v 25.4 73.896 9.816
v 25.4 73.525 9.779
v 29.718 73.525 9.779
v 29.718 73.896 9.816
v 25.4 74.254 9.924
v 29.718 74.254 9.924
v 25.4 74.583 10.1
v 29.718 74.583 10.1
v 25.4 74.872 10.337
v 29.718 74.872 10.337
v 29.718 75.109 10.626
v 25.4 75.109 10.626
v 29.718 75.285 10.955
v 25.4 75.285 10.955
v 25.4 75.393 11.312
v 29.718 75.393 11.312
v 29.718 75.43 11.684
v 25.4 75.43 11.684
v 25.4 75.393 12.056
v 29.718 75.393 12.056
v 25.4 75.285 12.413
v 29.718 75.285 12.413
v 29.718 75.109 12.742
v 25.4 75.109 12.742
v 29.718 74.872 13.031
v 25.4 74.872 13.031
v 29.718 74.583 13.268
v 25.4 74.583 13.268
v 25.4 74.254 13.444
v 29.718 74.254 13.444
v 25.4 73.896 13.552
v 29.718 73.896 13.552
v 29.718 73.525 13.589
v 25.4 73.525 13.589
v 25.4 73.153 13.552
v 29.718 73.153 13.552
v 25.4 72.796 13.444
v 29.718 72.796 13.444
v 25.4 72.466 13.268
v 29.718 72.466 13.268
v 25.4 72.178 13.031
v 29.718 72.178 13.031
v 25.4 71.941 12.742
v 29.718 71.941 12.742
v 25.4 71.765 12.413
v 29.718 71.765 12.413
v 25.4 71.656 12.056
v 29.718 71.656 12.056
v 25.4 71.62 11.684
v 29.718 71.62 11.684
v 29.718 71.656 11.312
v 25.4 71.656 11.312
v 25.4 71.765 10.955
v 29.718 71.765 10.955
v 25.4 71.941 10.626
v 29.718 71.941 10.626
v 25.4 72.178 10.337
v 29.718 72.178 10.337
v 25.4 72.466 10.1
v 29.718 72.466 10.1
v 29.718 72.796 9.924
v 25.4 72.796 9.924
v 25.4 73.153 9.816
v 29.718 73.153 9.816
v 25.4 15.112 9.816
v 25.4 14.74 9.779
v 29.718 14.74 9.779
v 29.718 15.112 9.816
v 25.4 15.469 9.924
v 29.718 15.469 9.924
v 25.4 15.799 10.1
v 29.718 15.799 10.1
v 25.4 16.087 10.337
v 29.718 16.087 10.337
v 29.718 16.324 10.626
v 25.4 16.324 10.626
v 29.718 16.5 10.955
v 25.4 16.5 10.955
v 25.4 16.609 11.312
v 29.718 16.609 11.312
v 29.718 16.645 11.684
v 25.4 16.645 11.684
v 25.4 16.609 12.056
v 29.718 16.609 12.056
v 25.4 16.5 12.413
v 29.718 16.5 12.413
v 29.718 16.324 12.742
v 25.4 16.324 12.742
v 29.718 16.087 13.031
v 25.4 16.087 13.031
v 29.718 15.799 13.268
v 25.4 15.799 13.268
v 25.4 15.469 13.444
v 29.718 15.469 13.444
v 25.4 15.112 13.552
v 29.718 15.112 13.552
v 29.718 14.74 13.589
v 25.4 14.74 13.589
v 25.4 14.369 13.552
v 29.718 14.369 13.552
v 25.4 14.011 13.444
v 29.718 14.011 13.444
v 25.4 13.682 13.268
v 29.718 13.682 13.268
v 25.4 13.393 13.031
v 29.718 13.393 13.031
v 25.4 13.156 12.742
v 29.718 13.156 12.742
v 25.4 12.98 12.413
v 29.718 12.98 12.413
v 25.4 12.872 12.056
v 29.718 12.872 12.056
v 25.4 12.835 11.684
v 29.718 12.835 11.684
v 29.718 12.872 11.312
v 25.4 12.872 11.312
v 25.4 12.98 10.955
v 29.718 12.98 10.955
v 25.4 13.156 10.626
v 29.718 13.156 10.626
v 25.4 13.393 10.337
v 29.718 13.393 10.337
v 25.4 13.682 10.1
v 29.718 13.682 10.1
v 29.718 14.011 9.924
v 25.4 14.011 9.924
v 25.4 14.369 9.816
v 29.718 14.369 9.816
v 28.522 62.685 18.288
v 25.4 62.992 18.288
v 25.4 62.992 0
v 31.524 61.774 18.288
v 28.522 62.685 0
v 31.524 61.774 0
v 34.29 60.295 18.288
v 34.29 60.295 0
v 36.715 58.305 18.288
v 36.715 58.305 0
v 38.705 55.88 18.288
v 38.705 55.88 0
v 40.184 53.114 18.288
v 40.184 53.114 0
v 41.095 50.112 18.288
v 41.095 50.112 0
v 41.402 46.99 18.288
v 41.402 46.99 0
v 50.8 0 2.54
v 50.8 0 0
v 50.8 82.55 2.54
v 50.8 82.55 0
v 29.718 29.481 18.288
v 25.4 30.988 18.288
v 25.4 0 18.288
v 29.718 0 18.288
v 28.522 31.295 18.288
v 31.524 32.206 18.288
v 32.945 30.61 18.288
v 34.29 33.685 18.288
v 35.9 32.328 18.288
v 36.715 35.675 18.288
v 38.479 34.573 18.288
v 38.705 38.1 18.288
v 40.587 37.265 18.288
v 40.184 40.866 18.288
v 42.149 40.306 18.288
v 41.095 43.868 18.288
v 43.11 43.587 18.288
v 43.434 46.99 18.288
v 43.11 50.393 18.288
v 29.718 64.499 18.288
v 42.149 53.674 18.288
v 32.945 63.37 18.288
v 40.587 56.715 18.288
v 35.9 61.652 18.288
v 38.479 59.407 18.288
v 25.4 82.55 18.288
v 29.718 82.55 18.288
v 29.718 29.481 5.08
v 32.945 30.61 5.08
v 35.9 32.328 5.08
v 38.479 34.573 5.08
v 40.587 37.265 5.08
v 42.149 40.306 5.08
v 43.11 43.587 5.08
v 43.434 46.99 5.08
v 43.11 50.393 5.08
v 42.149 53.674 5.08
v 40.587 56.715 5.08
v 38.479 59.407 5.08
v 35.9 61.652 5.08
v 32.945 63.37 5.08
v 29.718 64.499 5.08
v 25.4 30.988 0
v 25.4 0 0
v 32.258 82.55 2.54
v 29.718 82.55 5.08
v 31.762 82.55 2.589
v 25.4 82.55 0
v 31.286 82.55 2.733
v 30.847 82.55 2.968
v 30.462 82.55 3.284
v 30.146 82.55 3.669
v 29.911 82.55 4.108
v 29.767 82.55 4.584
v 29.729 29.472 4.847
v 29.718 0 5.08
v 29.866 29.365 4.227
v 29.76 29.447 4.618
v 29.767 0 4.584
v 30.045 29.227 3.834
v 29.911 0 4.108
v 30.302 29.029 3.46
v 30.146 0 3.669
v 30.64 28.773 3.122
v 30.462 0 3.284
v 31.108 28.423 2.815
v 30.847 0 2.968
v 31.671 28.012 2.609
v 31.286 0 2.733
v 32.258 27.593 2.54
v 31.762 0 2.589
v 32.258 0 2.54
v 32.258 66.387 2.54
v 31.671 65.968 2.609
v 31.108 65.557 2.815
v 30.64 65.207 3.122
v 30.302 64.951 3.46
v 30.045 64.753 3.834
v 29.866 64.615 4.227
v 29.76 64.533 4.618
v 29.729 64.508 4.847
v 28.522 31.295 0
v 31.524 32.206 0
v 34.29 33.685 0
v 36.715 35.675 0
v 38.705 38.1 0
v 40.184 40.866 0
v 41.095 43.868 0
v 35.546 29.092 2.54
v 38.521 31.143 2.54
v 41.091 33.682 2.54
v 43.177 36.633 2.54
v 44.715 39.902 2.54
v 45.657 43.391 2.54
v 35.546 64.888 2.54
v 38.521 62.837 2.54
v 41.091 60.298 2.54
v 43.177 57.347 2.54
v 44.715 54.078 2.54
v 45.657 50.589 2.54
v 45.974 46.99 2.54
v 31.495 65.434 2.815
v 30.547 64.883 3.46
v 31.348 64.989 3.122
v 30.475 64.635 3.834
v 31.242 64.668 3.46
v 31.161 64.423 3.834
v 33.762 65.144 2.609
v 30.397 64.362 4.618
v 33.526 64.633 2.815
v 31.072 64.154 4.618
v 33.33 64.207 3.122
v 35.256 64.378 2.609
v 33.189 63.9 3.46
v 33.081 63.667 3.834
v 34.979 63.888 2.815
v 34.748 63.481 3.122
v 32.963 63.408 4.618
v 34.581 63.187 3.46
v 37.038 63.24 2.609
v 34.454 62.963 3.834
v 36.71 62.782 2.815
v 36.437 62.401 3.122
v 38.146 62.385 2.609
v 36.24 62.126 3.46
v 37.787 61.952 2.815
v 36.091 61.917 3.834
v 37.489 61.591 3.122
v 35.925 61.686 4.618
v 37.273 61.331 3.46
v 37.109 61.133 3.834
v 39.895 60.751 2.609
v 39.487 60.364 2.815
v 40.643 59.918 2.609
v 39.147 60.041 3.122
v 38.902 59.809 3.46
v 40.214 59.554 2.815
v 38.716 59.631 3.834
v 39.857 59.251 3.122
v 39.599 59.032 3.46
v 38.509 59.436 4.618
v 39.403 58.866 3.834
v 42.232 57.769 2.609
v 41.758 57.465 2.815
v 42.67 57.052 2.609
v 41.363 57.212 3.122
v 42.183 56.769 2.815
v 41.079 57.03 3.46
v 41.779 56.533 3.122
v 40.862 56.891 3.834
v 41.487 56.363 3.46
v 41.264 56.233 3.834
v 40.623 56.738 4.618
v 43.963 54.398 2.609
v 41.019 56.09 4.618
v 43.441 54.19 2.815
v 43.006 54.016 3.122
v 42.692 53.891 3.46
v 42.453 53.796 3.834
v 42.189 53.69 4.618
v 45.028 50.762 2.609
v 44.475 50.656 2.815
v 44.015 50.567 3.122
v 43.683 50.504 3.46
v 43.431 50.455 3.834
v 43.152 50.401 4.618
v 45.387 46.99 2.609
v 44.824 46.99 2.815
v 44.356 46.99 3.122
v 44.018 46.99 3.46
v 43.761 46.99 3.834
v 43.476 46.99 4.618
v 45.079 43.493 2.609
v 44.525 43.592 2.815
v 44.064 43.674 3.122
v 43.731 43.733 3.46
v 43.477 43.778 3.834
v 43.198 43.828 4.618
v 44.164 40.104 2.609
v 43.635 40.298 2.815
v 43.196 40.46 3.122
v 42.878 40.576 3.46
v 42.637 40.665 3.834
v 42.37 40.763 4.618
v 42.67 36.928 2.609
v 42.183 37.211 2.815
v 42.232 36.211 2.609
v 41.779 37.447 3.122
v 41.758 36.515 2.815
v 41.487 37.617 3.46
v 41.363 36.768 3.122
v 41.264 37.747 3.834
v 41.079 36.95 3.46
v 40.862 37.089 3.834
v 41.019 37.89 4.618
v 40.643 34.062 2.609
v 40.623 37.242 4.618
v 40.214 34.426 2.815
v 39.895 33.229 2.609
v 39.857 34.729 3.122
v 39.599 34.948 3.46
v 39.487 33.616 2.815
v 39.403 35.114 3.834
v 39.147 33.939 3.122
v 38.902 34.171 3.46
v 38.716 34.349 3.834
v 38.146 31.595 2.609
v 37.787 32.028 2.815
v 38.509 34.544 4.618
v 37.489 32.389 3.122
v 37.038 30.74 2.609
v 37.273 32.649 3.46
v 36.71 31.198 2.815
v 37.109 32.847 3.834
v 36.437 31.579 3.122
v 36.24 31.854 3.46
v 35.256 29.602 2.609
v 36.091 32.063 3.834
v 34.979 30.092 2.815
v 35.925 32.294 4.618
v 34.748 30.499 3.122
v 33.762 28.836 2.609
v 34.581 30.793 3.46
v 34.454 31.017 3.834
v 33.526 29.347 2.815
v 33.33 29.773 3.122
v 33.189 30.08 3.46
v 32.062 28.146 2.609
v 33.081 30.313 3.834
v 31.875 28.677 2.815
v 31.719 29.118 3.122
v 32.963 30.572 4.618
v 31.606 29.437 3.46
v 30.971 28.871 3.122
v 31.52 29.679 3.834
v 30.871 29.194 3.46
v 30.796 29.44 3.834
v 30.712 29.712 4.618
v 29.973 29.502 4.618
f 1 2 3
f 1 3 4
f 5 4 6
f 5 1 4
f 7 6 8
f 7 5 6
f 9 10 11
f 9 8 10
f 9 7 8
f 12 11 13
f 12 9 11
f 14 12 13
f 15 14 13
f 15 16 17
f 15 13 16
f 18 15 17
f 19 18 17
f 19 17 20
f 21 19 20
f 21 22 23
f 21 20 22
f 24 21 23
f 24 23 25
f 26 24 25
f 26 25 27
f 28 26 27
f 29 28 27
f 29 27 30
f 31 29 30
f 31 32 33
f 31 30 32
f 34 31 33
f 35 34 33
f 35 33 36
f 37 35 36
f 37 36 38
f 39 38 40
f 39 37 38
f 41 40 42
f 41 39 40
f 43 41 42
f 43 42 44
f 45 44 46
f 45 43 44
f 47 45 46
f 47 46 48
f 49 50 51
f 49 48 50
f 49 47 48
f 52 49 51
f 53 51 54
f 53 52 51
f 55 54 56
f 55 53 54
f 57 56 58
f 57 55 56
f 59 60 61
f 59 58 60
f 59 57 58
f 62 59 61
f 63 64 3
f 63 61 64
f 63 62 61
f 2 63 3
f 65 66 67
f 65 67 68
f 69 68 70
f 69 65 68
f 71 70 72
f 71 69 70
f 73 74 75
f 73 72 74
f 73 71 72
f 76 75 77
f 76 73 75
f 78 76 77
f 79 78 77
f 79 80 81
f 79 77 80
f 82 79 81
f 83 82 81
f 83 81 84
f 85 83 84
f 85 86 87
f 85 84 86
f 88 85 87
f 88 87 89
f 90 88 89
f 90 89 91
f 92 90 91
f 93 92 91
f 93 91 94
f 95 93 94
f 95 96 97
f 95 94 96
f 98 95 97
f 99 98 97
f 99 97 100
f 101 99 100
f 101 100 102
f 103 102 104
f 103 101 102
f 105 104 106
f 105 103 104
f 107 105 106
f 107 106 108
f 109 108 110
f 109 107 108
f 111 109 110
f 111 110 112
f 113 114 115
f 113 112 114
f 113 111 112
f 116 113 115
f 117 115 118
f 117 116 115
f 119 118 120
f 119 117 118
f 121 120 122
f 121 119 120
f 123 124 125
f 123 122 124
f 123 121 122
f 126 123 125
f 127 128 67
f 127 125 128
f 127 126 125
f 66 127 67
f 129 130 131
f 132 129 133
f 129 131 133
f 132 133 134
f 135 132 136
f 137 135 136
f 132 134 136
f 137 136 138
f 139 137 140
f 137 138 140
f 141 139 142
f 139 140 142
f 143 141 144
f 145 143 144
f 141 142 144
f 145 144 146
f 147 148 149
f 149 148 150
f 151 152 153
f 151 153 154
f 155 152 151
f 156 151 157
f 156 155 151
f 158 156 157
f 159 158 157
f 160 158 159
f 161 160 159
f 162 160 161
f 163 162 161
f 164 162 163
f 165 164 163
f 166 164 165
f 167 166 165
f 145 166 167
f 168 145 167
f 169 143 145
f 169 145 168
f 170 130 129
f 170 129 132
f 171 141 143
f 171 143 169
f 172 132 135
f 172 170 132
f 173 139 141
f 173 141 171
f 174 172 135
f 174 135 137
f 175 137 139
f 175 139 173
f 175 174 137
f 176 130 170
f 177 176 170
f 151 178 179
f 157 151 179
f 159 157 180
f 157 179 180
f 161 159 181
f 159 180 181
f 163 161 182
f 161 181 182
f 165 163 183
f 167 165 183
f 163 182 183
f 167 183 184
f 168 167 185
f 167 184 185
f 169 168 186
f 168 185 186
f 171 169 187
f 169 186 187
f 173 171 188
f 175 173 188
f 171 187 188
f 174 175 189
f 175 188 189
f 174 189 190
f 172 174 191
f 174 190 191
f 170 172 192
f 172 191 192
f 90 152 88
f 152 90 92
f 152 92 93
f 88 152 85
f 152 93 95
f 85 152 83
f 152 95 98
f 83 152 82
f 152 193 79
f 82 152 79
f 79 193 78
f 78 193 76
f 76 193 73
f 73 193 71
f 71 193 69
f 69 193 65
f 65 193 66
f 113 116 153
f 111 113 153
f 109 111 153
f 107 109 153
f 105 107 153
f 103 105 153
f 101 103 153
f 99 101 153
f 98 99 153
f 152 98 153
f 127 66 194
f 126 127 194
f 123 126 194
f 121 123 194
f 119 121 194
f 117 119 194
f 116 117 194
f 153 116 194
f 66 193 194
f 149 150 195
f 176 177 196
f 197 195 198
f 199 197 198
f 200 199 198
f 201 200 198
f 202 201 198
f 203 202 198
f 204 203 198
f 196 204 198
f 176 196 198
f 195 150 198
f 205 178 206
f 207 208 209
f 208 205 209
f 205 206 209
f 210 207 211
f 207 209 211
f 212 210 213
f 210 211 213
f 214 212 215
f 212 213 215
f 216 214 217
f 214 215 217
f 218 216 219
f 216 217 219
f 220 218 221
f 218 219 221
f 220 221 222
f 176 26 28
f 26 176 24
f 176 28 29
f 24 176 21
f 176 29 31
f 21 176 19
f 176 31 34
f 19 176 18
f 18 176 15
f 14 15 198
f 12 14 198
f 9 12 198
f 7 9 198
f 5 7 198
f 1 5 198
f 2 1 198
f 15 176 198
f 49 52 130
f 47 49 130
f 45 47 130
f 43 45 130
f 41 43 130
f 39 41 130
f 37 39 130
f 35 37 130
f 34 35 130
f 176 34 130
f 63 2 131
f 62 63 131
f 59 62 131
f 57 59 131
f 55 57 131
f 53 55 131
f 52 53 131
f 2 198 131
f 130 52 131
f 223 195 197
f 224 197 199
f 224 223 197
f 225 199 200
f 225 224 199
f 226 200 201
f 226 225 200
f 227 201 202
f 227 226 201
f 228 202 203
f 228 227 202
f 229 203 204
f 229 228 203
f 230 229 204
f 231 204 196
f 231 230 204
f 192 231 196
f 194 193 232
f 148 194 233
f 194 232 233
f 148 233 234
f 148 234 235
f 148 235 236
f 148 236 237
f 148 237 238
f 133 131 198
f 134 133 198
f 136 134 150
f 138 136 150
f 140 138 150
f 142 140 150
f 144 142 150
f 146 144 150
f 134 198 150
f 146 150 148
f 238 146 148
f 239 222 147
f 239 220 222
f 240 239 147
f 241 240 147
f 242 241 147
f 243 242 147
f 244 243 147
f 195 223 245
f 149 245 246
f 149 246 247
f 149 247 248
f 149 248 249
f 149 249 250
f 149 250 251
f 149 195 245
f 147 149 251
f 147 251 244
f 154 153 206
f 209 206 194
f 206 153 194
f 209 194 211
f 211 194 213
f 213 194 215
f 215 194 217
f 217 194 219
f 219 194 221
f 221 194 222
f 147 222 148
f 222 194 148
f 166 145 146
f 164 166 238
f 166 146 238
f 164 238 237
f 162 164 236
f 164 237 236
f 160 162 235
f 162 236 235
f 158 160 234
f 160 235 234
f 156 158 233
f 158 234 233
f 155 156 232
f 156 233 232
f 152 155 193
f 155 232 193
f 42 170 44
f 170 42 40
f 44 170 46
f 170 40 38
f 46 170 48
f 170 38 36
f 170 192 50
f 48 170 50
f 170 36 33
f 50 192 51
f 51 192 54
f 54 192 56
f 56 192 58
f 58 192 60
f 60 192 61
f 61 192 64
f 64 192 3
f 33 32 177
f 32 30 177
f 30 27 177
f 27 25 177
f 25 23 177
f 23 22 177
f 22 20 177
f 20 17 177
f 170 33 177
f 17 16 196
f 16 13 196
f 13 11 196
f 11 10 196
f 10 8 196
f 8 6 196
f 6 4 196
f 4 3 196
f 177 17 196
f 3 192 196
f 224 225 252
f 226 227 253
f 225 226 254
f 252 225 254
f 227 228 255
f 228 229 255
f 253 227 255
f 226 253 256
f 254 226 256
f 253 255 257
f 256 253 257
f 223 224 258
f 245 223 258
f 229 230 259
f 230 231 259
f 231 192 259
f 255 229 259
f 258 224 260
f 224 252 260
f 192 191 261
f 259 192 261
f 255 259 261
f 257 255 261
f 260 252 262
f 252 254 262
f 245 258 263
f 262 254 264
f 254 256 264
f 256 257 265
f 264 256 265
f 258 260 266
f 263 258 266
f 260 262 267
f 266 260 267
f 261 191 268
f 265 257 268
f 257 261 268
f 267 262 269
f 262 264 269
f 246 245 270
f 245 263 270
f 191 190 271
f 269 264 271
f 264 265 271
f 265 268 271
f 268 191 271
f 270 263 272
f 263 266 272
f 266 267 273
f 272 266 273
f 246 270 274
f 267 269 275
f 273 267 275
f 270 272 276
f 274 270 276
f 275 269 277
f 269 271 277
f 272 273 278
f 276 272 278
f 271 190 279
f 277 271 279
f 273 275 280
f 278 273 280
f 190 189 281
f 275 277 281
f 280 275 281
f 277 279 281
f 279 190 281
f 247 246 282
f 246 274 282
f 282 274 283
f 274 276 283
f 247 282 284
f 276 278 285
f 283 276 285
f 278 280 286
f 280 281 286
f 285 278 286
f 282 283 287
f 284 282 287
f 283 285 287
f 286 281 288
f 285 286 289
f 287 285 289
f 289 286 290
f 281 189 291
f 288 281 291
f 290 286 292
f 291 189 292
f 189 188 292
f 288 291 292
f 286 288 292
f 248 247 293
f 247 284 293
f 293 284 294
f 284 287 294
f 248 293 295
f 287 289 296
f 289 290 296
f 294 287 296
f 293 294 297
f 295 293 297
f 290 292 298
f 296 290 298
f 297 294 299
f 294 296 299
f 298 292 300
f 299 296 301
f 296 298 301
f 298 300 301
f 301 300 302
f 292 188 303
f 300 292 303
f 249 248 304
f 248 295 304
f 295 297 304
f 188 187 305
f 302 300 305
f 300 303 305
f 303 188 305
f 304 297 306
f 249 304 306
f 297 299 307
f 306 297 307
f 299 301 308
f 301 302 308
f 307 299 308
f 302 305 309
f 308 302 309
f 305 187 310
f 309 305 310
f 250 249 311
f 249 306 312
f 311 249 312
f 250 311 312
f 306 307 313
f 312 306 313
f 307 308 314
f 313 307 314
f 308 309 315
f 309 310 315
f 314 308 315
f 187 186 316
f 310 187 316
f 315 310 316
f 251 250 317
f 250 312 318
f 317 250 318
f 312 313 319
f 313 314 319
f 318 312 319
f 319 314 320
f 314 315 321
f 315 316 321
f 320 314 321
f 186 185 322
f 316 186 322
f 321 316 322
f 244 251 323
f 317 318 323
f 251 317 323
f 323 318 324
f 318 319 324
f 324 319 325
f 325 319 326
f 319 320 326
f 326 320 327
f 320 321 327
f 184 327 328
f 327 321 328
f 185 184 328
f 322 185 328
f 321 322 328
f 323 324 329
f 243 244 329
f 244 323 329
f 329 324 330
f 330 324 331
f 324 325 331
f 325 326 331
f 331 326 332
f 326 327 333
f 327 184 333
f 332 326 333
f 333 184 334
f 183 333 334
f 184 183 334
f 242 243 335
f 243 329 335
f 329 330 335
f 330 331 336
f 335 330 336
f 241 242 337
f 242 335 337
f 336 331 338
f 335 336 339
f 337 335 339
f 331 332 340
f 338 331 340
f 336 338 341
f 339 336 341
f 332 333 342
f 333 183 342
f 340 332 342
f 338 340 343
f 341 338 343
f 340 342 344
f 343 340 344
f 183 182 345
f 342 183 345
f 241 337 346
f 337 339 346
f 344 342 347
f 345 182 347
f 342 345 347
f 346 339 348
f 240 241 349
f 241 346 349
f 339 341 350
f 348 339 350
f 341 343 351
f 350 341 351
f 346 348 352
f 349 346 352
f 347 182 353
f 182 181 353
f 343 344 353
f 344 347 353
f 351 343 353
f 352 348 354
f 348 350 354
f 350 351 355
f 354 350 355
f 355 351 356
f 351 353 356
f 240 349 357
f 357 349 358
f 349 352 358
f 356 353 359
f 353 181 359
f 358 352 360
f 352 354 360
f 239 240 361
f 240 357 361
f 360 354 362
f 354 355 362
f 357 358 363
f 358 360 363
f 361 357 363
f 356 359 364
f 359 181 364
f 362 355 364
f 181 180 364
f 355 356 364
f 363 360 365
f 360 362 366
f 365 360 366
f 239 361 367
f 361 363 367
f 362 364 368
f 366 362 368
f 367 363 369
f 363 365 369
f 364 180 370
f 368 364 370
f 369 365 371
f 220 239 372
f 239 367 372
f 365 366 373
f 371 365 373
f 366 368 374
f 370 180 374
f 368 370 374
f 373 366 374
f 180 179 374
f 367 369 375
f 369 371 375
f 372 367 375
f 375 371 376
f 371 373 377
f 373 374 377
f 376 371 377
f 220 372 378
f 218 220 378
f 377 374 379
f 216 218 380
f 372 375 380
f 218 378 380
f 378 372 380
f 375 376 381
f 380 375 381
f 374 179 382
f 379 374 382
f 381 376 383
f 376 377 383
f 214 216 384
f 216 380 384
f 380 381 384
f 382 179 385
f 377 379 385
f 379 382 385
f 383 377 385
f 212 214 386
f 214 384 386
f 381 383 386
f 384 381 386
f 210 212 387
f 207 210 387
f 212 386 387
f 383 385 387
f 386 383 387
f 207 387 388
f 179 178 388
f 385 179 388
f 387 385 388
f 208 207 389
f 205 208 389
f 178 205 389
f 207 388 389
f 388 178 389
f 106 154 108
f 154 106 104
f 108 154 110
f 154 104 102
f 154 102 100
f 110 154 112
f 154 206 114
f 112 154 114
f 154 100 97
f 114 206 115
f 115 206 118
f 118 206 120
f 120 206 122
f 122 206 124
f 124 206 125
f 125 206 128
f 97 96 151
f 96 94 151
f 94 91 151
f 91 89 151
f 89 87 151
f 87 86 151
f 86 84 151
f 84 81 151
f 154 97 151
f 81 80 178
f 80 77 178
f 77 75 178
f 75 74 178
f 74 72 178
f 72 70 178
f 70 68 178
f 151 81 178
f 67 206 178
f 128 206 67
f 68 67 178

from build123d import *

# Parameters (mm, degrees)
BOSS_EXTRUDE6_DEPTH = 18.288
BOSS_EXTRUDE7_DEPTH = 2.54
SKETCH4_R           = 1.905
CUT_EXTRUDE2_DEPTH  = 51.8
FILLET2_R           = 2.54


with BuildPart() as part:
    # Sketch3 → Boss-Extrude6 (new body)
    with BuildSketch(Plane.XY):
        with BuildLine():
            Line((25.4, 30.988), (25.4, 0))
            Line((25.4, 0), (29.718, 0))
            Line((29.718, 0), (29.718, 29.480573053))
            ThreePointArc((29.718, 29.480573053), (43.434, 46.99), (29.718, 64.499426947))
            Line((29.718, 64.499426947), (29.718, 82.55))
            Line((29.718, 82.55), (25.4, 82.55))
            Line((25.4, 82.55), (25.4, 62.992))
            ThreePointArc((25.4, 62.992), (36.715122713, 58.305122713), (41.402, 46.99))
            ThreePointArc((41.402, 46.99), (36.715122713, 35.674877287), (25.4, 30.988))
        make_face()
    extrude(amount=BOSS_EXTRUDE6_DEPTH)

    # Sketch3_10 → Boss-Extrude7 (add)
    with BuildSketch(Plane.XY):
        with BuildLine():
            Line((29.718, 29.480573053), (29.718, 0))
            Line((29.718, 0), (50.8, 0))
            Line((50.8, 0), (50.8, 82.55))
            Line((50.8, 82.55), (29.718, 82.55))
            Line((29.718, 82.55), (29.718, 64.499426947))
            ThreePointArc((29.718, 64.499426947), (43.434, 46.99), (29.718, 29.480573053))
        make_face()
    extrude(amount=BOSS_EXTRUDE7_DEPTH)

    # Sketch4 → Cut-Extrude2 (cut, through all)
    with BuildSketch(Plane(origin=(0, 0, 0), x_dir=(0, 0, -1), z_dir=(1, 0, 0))):
        with Locations((-11.684, 14.740286527)):
            Circle(SKETCH4_R)
        with Locations((-11.684, 73.524713473)):
            Circle(SKETCH4_R)
    extrude(amount=CUT_EXTRUDE2_DEPTH, mode=Mode.SUBTRACT)

    # Fillet2
    fillet2_edges = [part.edges().sort_by_distance(p)[0] for p in [
        (43.434, 46.99, 2.54),
        (29.718, 14.740286527, 2.54),
        (29.718, 73.524713473, 2.54),
    ]]
    fillet(fillet2_edges, radius=FILLET2_R)


solid = part.part
